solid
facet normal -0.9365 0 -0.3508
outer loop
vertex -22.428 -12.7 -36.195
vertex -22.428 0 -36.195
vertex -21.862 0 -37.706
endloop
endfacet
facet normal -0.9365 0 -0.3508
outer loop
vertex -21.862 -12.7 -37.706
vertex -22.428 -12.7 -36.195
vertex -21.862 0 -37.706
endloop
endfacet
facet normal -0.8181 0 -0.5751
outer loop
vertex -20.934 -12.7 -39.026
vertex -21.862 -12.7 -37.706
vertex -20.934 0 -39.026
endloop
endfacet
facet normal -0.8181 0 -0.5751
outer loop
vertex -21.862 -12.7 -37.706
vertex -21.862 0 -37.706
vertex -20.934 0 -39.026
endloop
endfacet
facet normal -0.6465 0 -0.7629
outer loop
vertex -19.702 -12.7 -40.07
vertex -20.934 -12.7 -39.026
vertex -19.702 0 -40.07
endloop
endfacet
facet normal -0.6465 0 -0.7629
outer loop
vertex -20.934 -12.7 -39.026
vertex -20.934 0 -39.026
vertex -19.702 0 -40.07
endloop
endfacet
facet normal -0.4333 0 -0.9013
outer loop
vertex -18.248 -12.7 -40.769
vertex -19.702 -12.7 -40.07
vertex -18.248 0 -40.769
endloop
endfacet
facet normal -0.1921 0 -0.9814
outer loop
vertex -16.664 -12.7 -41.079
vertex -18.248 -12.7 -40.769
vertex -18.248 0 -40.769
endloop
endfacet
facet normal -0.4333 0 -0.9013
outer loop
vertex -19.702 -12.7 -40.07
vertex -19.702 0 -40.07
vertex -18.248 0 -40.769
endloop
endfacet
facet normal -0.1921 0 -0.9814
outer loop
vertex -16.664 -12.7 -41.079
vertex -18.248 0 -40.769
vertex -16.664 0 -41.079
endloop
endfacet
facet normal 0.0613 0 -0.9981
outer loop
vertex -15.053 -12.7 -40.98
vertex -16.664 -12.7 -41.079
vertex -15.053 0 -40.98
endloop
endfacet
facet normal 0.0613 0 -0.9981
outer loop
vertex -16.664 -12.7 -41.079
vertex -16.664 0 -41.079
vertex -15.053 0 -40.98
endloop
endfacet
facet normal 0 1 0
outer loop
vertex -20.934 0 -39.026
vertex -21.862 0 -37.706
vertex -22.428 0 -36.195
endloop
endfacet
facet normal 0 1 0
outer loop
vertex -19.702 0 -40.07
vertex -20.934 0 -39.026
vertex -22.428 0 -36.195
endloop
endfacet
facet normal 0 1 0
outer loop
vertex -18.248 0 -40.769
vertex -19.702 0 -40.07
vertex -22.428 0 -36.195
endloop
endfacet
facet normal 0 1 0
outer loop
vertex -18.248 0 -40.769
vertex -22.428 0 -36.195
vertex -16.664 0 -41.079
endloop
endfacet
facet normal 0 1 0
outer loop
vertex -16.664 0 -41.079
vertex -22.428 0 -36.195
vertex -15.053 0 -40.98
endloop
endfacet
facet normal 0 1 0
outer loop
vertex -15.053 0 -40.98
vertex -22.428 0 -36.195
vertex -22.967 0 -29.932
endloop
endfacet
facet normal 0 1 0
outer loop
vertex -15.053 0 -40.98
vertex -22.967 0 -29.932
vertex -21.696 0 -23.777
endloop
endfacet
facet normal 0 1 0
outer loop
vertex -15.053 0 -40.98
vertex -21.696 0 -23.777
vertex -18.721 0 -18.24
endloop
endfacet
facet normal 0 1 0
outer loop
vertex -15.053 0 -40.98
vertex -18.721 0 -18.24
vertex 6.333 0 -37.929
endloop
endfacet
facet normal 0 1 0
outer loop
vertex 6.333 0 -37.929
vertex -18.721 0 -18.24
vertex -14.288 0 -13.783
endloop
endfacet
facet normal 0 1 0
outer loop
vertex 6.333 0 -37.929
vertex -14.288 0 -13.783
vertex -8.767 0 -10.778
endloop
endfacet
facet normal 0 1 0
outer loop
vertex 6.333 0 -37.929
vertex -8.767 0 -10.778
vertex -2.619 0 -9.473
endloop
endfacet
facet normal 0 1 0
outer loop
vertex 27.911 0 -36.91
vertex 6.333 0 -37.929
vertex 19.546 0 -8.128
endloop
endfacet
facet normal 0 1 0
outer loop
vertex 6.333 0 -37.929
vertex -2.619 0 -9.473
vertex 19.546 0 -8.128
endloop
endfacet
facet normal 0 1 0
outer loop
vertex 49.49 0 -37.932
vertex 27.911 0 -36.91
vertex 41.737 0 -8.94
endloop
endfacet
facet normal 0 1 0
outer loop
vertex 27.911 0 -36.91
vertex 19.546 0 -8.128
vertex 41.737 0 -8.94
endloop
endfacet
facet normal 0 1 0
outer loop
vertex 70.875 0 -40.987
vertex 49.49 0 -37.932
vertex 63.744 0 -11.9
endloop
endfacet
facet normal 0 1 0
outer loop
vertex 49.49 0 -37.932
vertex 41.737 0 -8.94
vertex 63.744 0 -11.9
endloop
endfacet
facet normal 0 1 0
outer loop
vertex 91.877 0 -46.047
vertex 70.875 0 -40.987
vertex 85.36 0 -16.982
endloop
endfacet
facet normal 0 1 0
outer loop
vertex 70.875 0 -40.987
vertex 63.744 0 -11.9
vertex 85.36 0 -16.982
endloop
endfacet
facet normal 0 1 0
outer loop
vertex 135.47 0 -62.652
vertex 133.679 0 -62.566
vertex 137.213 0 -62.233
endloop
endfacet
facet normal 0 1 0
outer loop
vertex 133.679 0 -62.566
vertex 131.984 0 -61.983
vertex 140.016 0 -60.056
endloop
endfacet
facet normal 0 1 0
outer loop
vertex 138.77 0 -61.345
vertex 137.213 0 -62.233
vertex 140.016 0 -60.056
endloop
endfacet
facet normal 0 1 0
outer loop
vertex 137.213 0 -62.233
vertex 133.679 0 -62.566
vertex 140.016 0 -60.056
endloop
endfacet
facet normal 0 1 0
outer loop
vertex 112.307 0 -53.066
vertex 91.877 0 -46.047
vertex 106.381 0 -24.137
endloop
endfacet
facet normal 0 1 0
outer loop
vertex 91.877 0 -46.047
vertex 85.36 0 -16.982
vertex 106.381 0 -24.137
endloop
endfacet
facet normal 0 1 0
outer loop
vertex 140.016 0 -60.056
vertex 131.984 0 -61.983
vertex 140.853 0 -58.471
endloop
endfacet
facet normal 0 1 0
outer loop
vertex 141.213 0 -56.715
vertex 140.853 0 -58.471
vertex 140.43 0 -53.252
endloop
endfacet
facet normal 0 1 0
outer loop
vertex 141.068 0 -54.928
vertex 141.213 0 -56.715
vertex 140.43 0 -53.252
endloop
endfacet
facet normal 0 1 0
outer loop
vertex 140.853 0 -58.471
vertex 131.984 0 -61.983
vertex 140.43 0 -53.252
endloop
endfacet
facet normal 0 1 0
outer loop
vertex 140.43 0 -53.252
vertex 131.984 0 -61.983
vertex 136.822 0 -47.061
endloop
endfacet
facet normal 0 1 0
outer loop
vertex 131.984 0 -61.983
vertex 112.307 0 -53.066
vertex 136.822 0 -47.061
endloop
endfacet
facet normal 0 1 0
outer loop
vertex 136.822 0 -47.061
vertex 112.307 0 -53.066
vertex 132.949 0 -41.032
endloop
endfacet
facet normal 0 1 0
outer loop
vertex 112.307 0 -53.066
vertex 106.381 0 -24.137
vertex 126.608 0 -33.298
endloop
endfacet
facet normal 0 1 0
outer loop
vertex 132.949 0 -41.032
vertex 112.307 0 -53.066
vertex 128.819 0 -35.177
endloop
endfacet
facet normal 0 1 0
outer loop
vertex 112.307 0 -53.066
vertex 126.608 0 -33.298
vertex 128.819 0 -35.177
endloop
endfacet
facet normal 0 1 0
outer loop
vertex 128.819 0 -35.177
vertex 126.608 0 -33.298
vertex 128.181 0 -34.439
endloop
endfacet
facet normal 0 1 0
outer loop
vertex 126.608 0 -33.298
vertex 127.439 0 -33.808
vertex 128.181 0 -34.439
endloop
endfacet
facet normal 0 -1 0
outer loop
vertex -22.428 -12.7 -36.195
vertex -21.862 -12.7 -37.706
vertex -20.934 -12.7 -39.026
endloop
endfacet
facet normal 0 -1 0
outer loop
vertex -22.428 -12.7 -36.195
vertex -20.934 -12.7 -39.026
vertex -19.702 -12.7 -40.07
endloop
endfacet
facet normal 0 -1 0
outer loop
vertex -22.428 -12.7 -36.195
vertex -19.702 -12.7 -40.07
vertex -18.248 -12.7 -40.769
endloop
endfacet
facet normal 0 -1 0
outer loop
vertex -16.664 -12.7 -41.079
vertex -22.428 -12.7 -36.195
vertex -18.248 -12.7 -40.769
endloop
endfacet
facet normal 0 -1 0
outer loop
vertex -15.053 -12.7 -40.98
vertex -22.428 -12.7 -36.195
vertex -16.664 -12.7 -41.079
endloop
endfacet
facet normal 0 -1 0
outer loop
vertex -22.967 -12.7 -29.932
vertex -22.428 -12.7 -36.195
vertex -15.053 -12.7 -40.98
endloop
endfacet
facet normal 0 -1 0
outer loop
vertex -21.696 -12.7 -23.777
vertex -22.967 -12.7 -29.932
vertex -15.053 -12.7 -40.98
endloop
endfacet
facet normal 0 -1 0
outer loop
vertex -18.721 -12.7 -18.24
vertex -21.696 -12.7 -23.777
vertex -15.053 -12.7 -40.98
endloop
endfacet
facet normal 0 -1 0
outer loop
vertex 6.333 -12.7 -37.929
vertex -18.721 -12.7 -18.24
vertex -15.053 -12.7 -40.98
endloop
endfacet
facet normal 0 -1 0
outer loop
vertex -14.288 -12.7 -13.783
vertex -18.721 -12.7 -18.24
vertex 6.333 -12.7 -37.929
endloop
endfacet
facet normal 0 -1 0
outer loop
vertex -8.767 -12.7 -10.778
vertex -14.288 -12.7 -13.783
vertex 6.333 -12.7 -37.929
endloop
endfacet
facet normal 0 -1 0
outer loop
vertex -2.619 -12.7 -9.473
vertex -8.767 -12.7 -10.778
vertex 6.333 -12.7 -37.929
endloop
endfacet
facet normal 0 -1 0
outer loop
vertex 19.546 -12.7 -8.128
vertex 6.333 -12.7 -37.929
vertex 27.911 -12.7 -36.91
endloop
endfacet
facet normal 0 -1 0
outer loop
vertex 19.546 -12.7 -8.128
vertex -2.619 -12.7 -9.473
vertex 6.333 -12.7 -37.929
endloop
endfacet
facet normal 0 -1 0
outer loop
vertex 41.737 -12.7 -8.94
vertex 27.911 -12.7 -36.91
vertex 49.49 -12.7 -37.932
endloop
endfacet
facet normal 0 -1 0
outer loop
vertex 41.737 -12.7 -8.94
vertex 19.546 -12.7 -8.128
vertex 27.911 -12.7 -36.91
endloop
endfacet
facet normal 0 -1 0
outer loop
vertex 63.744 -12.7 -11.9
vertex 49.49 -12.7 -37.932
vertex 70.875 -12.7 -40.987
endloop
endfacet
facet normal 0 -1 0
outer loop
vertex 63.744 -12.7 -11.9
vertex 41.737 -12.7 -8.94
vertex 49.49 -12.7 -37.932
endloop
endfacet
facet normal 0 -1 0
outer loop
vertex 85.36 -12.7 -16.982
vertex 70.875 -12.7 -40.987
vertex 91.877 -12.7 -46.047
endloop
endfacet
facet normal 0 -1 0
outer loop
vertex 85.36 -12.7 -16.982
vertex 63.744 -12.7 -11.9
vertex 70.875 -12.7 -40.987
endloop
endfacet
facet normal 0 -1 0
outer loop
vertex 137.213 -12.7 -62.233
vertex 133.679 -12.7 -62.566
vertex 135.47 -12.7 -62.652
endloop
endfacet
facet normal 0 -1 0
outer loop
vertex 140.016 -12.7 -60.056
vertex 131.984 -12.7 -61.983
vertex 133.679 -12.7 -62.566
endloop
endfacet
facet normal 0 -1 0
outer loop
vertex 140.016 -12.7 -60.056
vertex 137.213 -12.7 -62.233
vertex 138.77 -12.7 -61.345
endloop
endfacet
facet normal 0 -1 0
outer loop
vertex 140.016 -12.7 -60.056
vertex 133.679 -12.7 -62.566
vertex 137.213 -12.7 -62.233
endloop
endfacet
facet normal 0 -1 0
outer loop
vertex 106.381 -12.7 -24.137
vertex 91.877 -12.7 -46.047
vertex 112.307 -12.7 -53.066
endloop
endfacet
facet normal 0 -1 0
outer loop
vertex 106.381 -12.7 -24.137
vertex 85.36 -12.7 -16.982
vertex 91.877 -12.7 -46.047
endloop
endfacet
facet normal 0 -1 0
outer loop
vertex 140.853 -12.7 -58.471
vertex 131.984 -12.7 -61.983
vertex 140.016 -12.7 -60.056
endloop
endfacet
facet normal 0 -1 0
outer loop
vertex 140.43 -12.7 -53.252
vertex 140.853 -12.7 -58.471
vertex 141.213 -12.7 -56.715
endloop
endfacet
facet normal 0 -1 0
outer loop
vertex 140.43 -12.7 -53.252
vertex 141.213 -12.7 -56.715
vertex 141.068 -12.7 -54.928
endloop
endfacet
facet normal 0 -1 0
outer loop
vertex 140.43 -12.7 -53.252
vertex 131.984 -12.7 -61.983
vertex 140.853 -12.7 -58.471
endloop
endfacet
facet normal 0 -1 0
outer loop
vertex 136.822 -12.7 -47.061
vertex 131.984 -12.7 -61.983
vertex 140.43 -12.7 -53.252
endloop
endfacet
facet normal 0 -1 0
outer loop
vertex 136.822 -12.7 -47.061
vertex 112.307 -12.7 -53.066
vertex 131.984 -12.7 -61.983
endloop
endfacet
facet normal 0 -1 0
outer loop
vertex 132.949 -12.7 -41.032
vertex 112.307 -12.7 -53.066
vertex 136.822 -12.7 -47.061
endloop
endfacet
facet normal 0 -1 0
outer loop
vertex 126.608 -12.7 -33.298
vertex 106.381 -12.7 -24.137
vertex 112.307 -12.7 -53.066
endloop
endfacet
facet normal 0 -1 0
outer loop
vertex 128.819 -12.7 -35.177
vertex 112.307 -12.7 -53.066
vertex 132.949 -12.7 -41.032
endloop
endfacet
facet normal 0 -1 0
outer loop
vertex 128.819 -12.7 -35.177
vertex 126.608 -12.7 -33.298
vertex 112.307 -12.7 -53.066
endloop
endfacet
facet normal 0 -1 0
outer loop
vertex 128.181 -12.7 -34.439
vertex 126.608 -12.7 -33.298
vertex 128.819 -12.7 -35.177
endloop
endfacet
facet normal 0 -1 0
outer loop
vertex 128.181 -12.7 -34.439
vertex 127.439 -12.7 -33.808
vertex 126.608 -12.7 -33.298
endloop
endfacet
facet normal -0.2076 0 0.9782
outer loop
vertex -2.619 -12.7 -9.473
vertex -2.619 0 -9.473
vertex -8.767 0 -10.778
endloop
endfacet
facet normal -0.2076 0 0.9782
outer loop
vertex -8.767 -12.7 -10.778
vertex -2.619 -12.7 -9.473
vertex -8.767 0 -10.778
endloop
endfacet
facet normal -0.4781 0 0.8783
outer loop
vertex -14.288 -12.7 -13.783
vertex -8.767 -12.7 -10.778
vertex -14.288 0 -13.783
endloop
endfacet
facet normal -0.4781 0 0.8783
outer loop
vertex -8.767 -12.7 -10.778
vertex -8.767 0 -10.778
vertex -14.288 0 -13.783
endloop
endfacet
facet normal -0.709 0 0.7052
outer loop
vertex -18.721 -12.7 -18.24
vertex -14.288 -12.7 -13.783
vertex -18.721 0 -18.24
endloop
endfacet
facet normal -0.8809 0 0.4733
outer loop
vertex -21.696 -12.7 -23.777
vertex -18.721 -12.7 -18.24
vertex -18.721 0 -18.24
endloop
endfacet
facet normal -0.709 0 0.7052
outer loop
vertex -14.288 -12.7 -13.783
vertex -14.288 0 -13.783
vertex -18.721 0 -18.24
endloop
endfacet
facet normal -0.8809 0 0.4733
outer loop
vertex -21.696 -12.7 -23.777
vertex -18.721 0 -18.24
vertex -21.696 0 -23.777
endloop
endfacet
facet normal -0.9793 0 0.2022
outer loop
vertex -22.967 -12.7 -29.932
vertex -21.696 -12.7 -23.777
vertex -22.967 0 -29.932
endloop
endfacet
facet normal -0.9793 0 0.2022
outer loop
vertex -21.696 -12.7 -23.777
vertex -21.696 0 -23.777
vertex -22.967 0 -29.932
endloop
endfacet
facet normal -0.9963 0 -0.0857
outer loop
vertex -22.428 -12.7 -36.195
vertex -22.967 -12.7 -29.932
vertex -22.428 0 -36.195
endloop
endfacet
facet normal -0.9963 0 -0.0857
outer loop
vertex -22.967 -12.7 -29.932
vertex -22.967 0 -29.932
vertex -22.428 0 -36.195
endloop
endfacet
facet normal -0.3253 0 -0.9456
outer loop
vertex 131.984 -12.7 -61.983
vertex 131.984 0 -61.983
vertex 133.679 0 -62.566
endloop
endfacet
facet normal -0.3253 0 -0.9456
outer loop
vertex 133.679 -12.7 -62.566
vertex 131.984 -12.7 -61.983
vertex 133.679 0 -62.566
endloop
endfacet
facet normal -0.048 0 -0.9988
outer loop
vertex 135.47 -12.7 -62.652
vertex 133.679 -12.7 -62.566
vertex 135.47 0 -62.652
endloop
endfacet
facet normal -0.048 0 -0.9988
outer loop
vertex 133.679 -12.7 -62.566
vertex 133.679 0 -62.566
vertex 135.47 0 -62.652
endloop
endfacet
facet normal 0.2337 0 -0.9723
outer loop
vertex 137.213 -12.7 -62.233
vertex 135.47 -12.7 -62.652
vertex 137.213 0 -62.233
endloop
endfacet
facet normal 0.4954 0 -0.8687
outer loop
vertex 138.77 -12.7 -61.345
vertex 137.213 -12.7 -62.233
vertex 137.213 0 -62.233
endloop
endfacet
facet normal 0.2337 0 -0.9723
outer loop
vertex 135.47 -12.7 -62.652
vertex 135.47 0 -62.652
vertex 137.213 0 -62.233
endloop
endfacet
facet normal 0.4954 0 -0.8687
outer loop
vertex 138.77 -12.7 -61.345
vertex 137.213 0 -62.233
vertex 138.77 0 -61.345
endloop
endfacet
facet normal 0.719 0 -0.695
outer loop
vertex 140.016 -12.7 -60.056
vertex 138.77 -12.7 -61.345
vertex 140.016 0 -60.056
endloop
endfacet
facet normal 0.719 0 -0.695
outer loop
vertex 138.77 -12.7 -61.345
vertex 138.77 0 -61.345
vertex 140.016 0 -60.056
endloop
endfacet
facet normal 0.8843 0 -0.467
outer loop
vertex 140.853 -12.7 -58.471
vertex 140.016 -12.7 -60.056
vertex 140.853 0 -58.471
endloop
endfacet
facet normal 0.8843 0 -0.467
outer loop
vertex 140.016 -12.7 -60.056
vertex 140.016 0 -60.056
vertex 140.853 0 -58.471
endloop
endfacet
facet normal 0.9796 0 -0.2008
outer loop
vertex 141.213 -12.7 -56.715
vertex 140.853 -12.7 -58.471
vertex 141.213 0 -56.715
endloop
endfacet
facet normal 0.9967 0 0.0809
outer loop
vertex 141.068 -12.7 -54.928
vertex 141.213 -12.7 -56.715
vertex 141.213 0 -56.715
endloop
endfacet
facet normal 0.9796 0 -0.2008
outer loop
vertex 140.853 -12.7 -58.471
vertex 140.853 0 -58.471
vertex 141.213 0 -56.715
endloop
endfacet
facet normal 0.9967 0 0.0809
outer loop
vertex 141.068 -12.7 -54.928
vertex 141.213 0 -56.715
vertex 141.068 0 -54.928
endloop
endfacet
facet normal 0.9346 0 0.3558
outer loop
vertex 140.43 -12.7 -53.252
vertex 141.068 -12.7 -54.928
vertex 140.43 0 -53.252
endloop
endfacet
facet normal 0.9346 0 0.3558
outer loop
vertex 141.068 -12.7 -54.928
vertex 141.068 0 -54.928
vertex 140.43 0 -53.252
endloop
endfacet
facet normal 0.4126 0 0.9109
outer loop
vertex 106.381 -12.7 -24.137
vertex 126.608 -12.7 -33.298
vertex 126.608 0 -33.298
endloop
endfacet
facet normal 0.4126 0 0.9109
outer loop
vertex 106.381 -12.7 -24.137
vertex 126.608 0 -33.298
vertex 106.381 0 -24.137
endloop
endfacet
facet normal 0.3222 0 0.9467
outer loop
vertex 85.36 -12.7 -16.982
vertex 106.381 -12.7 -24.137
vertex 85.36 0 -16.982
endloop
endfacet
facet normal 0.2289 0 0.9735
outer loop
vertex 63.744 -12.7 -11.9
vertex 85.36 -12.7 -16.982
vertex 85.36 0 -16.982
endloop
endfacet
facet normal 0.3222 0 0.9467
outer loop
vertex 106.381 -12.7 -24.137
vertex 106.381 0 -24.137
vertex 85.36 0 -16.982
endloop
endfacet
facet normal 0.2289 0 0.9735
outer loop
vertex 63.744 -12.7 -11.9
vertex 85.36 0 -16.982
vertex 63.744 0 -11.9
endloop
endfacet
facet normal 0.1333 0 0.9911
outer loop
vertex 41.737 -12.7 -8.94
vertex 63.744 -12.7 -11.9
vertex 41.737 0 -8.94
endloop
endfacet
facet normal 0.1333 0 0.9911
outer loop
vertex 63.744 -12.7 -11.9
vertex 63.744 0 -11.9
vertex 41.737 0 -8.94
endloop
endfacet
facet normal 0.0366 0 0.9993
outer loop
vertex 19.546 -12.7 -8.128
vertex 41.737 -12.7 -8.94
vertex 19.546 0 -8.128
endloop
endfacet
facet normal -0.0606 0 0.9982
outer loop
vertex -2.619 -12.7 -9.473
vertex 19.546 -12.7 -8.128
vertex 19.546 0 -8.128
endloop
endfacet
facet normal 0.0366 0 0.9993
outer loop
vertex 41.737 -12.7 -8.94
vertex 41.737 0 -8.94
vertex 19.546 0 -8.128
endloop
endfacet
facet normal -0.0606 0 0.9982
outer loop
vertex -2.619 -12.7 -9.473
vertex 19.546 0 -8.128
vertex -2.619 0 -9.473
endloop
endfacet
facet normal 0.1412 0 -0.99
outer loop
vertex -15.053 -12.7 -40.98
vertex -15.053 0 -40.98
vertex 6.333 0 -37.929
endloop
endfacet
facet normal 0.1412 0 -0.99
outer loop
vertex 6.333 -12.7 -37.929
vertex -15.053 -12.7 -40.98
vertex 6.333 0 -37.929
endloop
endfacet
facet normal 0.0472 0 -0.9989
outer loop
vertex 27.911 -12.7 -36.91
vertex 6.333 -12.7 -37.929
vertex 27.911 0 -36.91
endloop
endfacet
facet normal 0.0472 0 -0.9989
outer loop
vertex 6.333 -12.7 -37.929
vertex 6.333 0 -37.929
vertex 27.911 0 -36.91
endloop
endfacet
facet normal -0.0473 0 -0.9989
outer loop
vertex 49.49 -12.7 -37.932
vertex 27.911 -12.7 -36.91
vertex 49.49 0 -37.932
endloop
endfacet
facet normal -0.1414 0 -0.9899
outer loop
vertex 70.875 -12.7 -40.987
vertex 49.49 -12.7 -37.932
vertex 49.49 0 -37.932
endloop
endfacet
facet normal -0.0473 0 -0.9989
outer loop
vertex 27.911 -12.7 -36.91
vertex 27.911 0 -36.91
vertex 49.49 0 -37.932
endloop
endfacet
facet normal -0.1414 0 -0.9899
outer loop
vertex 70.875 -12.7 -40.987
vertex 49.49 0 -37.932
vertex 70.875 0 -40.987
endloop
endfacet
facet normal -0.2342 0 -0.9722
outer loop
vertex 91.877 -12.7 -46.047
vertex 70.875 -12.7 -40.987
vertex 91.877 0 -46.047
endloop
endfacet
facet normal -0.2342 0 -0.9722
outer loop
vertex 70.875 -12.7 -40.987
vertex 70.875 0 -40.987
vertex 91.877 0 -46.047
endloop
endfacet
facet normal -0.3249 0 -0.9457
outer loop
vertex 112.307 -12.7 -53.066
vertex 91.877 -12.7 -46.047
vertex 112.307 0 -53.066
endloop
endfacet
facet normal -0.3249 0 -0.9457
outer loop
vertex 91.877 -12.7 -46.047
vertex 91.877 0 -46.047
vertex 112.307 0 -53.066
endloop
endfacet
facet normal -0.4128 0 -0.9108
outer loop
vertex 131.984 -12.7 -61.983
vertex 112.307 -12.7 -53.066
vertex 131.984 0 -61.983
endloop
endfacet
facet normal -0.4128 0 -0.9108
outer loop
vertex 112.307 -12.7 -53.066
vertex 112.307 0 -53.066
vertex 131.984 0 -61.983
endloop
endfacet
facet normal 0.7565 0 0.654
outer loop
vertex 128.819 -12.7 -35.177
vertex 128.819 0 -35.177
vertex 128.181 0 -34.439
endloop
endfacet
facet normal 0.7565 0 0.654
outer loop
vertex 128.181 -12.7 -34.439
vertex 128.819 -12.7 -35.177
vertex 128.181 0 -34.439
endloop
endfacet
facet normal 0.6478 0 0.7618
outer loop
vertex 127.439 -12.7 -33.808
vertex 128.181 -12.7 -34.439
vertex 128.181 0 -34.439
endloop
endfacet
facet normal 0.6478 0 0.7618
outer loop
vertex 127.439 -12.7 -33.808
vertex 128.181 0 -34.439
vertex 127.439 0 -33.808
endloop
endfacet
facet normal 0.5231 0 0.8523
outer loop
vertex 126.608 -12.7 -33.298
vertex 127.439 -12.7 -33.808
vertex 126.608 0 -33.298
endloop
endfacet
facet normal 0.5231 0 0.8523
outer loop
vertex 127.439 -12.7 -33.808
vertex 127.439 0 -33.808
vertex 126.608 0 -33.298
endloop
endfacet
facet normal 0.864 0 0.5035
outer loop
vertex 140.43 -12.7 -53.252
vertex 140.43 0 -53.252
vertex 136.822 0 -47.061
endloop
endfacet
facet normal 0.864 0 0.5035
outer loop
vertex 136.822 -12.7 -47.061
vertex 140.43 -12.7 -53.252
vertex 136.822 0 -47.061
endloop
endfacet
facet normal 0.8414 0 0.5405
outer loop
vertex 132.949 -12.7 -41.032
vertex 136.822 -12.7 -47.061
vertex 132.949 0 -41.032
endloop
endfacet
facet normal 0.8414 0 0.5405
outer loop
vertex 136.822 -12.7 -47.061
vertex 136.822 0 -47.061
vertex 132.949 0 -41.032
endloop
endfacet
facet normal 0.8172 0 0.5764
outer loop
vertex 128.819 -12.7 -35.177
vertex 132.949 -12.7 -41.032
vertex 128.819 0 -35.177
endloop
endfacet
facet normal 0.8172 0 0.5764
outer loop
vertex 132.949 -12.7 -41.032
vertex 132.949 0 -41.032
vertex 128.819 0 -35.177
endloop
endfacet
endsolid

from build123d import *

# Parameters (mm, degrees)
F1_DEPTH = 12.7


with BuildPart() as f1:
    # F0 (on Front) → F1 (new body)
    with BuildSketch(Plane.XZ):
        with BuildLine():
            ThreePointArc((126.608238, -33.298336), (63.743612, -11.900326), (-2.618616, -9.473213))
            ThreePointArc((-2.618616, -9.473213), (-18.720598, -18.239824), (-22.427845, -36.194868))
            ThreePointArc((-22.427845, -36.194868), (-19.702387, -40.069858), (-15.053131, -40.979846))
            ThreePointArc((-15.053131, -40.979846), (60.218564, -39.206701), (131.983539, -61.983018))
            ThreePointArc((131.983539, -61.983018), (139.438808, -60.744668), (140.429628, -53.252484))
            ThreePointArc((140.429628, -53.252484), (134.91852, -44.025519), (128.818874, -35.176593))
            ThreePointArc((128.818874, -35.176593), (127.822247, -34.10954), (126.608238, -33.298336))
        make_face()
    extrude(amount=F1_DEPTH)


solid = f1.part
